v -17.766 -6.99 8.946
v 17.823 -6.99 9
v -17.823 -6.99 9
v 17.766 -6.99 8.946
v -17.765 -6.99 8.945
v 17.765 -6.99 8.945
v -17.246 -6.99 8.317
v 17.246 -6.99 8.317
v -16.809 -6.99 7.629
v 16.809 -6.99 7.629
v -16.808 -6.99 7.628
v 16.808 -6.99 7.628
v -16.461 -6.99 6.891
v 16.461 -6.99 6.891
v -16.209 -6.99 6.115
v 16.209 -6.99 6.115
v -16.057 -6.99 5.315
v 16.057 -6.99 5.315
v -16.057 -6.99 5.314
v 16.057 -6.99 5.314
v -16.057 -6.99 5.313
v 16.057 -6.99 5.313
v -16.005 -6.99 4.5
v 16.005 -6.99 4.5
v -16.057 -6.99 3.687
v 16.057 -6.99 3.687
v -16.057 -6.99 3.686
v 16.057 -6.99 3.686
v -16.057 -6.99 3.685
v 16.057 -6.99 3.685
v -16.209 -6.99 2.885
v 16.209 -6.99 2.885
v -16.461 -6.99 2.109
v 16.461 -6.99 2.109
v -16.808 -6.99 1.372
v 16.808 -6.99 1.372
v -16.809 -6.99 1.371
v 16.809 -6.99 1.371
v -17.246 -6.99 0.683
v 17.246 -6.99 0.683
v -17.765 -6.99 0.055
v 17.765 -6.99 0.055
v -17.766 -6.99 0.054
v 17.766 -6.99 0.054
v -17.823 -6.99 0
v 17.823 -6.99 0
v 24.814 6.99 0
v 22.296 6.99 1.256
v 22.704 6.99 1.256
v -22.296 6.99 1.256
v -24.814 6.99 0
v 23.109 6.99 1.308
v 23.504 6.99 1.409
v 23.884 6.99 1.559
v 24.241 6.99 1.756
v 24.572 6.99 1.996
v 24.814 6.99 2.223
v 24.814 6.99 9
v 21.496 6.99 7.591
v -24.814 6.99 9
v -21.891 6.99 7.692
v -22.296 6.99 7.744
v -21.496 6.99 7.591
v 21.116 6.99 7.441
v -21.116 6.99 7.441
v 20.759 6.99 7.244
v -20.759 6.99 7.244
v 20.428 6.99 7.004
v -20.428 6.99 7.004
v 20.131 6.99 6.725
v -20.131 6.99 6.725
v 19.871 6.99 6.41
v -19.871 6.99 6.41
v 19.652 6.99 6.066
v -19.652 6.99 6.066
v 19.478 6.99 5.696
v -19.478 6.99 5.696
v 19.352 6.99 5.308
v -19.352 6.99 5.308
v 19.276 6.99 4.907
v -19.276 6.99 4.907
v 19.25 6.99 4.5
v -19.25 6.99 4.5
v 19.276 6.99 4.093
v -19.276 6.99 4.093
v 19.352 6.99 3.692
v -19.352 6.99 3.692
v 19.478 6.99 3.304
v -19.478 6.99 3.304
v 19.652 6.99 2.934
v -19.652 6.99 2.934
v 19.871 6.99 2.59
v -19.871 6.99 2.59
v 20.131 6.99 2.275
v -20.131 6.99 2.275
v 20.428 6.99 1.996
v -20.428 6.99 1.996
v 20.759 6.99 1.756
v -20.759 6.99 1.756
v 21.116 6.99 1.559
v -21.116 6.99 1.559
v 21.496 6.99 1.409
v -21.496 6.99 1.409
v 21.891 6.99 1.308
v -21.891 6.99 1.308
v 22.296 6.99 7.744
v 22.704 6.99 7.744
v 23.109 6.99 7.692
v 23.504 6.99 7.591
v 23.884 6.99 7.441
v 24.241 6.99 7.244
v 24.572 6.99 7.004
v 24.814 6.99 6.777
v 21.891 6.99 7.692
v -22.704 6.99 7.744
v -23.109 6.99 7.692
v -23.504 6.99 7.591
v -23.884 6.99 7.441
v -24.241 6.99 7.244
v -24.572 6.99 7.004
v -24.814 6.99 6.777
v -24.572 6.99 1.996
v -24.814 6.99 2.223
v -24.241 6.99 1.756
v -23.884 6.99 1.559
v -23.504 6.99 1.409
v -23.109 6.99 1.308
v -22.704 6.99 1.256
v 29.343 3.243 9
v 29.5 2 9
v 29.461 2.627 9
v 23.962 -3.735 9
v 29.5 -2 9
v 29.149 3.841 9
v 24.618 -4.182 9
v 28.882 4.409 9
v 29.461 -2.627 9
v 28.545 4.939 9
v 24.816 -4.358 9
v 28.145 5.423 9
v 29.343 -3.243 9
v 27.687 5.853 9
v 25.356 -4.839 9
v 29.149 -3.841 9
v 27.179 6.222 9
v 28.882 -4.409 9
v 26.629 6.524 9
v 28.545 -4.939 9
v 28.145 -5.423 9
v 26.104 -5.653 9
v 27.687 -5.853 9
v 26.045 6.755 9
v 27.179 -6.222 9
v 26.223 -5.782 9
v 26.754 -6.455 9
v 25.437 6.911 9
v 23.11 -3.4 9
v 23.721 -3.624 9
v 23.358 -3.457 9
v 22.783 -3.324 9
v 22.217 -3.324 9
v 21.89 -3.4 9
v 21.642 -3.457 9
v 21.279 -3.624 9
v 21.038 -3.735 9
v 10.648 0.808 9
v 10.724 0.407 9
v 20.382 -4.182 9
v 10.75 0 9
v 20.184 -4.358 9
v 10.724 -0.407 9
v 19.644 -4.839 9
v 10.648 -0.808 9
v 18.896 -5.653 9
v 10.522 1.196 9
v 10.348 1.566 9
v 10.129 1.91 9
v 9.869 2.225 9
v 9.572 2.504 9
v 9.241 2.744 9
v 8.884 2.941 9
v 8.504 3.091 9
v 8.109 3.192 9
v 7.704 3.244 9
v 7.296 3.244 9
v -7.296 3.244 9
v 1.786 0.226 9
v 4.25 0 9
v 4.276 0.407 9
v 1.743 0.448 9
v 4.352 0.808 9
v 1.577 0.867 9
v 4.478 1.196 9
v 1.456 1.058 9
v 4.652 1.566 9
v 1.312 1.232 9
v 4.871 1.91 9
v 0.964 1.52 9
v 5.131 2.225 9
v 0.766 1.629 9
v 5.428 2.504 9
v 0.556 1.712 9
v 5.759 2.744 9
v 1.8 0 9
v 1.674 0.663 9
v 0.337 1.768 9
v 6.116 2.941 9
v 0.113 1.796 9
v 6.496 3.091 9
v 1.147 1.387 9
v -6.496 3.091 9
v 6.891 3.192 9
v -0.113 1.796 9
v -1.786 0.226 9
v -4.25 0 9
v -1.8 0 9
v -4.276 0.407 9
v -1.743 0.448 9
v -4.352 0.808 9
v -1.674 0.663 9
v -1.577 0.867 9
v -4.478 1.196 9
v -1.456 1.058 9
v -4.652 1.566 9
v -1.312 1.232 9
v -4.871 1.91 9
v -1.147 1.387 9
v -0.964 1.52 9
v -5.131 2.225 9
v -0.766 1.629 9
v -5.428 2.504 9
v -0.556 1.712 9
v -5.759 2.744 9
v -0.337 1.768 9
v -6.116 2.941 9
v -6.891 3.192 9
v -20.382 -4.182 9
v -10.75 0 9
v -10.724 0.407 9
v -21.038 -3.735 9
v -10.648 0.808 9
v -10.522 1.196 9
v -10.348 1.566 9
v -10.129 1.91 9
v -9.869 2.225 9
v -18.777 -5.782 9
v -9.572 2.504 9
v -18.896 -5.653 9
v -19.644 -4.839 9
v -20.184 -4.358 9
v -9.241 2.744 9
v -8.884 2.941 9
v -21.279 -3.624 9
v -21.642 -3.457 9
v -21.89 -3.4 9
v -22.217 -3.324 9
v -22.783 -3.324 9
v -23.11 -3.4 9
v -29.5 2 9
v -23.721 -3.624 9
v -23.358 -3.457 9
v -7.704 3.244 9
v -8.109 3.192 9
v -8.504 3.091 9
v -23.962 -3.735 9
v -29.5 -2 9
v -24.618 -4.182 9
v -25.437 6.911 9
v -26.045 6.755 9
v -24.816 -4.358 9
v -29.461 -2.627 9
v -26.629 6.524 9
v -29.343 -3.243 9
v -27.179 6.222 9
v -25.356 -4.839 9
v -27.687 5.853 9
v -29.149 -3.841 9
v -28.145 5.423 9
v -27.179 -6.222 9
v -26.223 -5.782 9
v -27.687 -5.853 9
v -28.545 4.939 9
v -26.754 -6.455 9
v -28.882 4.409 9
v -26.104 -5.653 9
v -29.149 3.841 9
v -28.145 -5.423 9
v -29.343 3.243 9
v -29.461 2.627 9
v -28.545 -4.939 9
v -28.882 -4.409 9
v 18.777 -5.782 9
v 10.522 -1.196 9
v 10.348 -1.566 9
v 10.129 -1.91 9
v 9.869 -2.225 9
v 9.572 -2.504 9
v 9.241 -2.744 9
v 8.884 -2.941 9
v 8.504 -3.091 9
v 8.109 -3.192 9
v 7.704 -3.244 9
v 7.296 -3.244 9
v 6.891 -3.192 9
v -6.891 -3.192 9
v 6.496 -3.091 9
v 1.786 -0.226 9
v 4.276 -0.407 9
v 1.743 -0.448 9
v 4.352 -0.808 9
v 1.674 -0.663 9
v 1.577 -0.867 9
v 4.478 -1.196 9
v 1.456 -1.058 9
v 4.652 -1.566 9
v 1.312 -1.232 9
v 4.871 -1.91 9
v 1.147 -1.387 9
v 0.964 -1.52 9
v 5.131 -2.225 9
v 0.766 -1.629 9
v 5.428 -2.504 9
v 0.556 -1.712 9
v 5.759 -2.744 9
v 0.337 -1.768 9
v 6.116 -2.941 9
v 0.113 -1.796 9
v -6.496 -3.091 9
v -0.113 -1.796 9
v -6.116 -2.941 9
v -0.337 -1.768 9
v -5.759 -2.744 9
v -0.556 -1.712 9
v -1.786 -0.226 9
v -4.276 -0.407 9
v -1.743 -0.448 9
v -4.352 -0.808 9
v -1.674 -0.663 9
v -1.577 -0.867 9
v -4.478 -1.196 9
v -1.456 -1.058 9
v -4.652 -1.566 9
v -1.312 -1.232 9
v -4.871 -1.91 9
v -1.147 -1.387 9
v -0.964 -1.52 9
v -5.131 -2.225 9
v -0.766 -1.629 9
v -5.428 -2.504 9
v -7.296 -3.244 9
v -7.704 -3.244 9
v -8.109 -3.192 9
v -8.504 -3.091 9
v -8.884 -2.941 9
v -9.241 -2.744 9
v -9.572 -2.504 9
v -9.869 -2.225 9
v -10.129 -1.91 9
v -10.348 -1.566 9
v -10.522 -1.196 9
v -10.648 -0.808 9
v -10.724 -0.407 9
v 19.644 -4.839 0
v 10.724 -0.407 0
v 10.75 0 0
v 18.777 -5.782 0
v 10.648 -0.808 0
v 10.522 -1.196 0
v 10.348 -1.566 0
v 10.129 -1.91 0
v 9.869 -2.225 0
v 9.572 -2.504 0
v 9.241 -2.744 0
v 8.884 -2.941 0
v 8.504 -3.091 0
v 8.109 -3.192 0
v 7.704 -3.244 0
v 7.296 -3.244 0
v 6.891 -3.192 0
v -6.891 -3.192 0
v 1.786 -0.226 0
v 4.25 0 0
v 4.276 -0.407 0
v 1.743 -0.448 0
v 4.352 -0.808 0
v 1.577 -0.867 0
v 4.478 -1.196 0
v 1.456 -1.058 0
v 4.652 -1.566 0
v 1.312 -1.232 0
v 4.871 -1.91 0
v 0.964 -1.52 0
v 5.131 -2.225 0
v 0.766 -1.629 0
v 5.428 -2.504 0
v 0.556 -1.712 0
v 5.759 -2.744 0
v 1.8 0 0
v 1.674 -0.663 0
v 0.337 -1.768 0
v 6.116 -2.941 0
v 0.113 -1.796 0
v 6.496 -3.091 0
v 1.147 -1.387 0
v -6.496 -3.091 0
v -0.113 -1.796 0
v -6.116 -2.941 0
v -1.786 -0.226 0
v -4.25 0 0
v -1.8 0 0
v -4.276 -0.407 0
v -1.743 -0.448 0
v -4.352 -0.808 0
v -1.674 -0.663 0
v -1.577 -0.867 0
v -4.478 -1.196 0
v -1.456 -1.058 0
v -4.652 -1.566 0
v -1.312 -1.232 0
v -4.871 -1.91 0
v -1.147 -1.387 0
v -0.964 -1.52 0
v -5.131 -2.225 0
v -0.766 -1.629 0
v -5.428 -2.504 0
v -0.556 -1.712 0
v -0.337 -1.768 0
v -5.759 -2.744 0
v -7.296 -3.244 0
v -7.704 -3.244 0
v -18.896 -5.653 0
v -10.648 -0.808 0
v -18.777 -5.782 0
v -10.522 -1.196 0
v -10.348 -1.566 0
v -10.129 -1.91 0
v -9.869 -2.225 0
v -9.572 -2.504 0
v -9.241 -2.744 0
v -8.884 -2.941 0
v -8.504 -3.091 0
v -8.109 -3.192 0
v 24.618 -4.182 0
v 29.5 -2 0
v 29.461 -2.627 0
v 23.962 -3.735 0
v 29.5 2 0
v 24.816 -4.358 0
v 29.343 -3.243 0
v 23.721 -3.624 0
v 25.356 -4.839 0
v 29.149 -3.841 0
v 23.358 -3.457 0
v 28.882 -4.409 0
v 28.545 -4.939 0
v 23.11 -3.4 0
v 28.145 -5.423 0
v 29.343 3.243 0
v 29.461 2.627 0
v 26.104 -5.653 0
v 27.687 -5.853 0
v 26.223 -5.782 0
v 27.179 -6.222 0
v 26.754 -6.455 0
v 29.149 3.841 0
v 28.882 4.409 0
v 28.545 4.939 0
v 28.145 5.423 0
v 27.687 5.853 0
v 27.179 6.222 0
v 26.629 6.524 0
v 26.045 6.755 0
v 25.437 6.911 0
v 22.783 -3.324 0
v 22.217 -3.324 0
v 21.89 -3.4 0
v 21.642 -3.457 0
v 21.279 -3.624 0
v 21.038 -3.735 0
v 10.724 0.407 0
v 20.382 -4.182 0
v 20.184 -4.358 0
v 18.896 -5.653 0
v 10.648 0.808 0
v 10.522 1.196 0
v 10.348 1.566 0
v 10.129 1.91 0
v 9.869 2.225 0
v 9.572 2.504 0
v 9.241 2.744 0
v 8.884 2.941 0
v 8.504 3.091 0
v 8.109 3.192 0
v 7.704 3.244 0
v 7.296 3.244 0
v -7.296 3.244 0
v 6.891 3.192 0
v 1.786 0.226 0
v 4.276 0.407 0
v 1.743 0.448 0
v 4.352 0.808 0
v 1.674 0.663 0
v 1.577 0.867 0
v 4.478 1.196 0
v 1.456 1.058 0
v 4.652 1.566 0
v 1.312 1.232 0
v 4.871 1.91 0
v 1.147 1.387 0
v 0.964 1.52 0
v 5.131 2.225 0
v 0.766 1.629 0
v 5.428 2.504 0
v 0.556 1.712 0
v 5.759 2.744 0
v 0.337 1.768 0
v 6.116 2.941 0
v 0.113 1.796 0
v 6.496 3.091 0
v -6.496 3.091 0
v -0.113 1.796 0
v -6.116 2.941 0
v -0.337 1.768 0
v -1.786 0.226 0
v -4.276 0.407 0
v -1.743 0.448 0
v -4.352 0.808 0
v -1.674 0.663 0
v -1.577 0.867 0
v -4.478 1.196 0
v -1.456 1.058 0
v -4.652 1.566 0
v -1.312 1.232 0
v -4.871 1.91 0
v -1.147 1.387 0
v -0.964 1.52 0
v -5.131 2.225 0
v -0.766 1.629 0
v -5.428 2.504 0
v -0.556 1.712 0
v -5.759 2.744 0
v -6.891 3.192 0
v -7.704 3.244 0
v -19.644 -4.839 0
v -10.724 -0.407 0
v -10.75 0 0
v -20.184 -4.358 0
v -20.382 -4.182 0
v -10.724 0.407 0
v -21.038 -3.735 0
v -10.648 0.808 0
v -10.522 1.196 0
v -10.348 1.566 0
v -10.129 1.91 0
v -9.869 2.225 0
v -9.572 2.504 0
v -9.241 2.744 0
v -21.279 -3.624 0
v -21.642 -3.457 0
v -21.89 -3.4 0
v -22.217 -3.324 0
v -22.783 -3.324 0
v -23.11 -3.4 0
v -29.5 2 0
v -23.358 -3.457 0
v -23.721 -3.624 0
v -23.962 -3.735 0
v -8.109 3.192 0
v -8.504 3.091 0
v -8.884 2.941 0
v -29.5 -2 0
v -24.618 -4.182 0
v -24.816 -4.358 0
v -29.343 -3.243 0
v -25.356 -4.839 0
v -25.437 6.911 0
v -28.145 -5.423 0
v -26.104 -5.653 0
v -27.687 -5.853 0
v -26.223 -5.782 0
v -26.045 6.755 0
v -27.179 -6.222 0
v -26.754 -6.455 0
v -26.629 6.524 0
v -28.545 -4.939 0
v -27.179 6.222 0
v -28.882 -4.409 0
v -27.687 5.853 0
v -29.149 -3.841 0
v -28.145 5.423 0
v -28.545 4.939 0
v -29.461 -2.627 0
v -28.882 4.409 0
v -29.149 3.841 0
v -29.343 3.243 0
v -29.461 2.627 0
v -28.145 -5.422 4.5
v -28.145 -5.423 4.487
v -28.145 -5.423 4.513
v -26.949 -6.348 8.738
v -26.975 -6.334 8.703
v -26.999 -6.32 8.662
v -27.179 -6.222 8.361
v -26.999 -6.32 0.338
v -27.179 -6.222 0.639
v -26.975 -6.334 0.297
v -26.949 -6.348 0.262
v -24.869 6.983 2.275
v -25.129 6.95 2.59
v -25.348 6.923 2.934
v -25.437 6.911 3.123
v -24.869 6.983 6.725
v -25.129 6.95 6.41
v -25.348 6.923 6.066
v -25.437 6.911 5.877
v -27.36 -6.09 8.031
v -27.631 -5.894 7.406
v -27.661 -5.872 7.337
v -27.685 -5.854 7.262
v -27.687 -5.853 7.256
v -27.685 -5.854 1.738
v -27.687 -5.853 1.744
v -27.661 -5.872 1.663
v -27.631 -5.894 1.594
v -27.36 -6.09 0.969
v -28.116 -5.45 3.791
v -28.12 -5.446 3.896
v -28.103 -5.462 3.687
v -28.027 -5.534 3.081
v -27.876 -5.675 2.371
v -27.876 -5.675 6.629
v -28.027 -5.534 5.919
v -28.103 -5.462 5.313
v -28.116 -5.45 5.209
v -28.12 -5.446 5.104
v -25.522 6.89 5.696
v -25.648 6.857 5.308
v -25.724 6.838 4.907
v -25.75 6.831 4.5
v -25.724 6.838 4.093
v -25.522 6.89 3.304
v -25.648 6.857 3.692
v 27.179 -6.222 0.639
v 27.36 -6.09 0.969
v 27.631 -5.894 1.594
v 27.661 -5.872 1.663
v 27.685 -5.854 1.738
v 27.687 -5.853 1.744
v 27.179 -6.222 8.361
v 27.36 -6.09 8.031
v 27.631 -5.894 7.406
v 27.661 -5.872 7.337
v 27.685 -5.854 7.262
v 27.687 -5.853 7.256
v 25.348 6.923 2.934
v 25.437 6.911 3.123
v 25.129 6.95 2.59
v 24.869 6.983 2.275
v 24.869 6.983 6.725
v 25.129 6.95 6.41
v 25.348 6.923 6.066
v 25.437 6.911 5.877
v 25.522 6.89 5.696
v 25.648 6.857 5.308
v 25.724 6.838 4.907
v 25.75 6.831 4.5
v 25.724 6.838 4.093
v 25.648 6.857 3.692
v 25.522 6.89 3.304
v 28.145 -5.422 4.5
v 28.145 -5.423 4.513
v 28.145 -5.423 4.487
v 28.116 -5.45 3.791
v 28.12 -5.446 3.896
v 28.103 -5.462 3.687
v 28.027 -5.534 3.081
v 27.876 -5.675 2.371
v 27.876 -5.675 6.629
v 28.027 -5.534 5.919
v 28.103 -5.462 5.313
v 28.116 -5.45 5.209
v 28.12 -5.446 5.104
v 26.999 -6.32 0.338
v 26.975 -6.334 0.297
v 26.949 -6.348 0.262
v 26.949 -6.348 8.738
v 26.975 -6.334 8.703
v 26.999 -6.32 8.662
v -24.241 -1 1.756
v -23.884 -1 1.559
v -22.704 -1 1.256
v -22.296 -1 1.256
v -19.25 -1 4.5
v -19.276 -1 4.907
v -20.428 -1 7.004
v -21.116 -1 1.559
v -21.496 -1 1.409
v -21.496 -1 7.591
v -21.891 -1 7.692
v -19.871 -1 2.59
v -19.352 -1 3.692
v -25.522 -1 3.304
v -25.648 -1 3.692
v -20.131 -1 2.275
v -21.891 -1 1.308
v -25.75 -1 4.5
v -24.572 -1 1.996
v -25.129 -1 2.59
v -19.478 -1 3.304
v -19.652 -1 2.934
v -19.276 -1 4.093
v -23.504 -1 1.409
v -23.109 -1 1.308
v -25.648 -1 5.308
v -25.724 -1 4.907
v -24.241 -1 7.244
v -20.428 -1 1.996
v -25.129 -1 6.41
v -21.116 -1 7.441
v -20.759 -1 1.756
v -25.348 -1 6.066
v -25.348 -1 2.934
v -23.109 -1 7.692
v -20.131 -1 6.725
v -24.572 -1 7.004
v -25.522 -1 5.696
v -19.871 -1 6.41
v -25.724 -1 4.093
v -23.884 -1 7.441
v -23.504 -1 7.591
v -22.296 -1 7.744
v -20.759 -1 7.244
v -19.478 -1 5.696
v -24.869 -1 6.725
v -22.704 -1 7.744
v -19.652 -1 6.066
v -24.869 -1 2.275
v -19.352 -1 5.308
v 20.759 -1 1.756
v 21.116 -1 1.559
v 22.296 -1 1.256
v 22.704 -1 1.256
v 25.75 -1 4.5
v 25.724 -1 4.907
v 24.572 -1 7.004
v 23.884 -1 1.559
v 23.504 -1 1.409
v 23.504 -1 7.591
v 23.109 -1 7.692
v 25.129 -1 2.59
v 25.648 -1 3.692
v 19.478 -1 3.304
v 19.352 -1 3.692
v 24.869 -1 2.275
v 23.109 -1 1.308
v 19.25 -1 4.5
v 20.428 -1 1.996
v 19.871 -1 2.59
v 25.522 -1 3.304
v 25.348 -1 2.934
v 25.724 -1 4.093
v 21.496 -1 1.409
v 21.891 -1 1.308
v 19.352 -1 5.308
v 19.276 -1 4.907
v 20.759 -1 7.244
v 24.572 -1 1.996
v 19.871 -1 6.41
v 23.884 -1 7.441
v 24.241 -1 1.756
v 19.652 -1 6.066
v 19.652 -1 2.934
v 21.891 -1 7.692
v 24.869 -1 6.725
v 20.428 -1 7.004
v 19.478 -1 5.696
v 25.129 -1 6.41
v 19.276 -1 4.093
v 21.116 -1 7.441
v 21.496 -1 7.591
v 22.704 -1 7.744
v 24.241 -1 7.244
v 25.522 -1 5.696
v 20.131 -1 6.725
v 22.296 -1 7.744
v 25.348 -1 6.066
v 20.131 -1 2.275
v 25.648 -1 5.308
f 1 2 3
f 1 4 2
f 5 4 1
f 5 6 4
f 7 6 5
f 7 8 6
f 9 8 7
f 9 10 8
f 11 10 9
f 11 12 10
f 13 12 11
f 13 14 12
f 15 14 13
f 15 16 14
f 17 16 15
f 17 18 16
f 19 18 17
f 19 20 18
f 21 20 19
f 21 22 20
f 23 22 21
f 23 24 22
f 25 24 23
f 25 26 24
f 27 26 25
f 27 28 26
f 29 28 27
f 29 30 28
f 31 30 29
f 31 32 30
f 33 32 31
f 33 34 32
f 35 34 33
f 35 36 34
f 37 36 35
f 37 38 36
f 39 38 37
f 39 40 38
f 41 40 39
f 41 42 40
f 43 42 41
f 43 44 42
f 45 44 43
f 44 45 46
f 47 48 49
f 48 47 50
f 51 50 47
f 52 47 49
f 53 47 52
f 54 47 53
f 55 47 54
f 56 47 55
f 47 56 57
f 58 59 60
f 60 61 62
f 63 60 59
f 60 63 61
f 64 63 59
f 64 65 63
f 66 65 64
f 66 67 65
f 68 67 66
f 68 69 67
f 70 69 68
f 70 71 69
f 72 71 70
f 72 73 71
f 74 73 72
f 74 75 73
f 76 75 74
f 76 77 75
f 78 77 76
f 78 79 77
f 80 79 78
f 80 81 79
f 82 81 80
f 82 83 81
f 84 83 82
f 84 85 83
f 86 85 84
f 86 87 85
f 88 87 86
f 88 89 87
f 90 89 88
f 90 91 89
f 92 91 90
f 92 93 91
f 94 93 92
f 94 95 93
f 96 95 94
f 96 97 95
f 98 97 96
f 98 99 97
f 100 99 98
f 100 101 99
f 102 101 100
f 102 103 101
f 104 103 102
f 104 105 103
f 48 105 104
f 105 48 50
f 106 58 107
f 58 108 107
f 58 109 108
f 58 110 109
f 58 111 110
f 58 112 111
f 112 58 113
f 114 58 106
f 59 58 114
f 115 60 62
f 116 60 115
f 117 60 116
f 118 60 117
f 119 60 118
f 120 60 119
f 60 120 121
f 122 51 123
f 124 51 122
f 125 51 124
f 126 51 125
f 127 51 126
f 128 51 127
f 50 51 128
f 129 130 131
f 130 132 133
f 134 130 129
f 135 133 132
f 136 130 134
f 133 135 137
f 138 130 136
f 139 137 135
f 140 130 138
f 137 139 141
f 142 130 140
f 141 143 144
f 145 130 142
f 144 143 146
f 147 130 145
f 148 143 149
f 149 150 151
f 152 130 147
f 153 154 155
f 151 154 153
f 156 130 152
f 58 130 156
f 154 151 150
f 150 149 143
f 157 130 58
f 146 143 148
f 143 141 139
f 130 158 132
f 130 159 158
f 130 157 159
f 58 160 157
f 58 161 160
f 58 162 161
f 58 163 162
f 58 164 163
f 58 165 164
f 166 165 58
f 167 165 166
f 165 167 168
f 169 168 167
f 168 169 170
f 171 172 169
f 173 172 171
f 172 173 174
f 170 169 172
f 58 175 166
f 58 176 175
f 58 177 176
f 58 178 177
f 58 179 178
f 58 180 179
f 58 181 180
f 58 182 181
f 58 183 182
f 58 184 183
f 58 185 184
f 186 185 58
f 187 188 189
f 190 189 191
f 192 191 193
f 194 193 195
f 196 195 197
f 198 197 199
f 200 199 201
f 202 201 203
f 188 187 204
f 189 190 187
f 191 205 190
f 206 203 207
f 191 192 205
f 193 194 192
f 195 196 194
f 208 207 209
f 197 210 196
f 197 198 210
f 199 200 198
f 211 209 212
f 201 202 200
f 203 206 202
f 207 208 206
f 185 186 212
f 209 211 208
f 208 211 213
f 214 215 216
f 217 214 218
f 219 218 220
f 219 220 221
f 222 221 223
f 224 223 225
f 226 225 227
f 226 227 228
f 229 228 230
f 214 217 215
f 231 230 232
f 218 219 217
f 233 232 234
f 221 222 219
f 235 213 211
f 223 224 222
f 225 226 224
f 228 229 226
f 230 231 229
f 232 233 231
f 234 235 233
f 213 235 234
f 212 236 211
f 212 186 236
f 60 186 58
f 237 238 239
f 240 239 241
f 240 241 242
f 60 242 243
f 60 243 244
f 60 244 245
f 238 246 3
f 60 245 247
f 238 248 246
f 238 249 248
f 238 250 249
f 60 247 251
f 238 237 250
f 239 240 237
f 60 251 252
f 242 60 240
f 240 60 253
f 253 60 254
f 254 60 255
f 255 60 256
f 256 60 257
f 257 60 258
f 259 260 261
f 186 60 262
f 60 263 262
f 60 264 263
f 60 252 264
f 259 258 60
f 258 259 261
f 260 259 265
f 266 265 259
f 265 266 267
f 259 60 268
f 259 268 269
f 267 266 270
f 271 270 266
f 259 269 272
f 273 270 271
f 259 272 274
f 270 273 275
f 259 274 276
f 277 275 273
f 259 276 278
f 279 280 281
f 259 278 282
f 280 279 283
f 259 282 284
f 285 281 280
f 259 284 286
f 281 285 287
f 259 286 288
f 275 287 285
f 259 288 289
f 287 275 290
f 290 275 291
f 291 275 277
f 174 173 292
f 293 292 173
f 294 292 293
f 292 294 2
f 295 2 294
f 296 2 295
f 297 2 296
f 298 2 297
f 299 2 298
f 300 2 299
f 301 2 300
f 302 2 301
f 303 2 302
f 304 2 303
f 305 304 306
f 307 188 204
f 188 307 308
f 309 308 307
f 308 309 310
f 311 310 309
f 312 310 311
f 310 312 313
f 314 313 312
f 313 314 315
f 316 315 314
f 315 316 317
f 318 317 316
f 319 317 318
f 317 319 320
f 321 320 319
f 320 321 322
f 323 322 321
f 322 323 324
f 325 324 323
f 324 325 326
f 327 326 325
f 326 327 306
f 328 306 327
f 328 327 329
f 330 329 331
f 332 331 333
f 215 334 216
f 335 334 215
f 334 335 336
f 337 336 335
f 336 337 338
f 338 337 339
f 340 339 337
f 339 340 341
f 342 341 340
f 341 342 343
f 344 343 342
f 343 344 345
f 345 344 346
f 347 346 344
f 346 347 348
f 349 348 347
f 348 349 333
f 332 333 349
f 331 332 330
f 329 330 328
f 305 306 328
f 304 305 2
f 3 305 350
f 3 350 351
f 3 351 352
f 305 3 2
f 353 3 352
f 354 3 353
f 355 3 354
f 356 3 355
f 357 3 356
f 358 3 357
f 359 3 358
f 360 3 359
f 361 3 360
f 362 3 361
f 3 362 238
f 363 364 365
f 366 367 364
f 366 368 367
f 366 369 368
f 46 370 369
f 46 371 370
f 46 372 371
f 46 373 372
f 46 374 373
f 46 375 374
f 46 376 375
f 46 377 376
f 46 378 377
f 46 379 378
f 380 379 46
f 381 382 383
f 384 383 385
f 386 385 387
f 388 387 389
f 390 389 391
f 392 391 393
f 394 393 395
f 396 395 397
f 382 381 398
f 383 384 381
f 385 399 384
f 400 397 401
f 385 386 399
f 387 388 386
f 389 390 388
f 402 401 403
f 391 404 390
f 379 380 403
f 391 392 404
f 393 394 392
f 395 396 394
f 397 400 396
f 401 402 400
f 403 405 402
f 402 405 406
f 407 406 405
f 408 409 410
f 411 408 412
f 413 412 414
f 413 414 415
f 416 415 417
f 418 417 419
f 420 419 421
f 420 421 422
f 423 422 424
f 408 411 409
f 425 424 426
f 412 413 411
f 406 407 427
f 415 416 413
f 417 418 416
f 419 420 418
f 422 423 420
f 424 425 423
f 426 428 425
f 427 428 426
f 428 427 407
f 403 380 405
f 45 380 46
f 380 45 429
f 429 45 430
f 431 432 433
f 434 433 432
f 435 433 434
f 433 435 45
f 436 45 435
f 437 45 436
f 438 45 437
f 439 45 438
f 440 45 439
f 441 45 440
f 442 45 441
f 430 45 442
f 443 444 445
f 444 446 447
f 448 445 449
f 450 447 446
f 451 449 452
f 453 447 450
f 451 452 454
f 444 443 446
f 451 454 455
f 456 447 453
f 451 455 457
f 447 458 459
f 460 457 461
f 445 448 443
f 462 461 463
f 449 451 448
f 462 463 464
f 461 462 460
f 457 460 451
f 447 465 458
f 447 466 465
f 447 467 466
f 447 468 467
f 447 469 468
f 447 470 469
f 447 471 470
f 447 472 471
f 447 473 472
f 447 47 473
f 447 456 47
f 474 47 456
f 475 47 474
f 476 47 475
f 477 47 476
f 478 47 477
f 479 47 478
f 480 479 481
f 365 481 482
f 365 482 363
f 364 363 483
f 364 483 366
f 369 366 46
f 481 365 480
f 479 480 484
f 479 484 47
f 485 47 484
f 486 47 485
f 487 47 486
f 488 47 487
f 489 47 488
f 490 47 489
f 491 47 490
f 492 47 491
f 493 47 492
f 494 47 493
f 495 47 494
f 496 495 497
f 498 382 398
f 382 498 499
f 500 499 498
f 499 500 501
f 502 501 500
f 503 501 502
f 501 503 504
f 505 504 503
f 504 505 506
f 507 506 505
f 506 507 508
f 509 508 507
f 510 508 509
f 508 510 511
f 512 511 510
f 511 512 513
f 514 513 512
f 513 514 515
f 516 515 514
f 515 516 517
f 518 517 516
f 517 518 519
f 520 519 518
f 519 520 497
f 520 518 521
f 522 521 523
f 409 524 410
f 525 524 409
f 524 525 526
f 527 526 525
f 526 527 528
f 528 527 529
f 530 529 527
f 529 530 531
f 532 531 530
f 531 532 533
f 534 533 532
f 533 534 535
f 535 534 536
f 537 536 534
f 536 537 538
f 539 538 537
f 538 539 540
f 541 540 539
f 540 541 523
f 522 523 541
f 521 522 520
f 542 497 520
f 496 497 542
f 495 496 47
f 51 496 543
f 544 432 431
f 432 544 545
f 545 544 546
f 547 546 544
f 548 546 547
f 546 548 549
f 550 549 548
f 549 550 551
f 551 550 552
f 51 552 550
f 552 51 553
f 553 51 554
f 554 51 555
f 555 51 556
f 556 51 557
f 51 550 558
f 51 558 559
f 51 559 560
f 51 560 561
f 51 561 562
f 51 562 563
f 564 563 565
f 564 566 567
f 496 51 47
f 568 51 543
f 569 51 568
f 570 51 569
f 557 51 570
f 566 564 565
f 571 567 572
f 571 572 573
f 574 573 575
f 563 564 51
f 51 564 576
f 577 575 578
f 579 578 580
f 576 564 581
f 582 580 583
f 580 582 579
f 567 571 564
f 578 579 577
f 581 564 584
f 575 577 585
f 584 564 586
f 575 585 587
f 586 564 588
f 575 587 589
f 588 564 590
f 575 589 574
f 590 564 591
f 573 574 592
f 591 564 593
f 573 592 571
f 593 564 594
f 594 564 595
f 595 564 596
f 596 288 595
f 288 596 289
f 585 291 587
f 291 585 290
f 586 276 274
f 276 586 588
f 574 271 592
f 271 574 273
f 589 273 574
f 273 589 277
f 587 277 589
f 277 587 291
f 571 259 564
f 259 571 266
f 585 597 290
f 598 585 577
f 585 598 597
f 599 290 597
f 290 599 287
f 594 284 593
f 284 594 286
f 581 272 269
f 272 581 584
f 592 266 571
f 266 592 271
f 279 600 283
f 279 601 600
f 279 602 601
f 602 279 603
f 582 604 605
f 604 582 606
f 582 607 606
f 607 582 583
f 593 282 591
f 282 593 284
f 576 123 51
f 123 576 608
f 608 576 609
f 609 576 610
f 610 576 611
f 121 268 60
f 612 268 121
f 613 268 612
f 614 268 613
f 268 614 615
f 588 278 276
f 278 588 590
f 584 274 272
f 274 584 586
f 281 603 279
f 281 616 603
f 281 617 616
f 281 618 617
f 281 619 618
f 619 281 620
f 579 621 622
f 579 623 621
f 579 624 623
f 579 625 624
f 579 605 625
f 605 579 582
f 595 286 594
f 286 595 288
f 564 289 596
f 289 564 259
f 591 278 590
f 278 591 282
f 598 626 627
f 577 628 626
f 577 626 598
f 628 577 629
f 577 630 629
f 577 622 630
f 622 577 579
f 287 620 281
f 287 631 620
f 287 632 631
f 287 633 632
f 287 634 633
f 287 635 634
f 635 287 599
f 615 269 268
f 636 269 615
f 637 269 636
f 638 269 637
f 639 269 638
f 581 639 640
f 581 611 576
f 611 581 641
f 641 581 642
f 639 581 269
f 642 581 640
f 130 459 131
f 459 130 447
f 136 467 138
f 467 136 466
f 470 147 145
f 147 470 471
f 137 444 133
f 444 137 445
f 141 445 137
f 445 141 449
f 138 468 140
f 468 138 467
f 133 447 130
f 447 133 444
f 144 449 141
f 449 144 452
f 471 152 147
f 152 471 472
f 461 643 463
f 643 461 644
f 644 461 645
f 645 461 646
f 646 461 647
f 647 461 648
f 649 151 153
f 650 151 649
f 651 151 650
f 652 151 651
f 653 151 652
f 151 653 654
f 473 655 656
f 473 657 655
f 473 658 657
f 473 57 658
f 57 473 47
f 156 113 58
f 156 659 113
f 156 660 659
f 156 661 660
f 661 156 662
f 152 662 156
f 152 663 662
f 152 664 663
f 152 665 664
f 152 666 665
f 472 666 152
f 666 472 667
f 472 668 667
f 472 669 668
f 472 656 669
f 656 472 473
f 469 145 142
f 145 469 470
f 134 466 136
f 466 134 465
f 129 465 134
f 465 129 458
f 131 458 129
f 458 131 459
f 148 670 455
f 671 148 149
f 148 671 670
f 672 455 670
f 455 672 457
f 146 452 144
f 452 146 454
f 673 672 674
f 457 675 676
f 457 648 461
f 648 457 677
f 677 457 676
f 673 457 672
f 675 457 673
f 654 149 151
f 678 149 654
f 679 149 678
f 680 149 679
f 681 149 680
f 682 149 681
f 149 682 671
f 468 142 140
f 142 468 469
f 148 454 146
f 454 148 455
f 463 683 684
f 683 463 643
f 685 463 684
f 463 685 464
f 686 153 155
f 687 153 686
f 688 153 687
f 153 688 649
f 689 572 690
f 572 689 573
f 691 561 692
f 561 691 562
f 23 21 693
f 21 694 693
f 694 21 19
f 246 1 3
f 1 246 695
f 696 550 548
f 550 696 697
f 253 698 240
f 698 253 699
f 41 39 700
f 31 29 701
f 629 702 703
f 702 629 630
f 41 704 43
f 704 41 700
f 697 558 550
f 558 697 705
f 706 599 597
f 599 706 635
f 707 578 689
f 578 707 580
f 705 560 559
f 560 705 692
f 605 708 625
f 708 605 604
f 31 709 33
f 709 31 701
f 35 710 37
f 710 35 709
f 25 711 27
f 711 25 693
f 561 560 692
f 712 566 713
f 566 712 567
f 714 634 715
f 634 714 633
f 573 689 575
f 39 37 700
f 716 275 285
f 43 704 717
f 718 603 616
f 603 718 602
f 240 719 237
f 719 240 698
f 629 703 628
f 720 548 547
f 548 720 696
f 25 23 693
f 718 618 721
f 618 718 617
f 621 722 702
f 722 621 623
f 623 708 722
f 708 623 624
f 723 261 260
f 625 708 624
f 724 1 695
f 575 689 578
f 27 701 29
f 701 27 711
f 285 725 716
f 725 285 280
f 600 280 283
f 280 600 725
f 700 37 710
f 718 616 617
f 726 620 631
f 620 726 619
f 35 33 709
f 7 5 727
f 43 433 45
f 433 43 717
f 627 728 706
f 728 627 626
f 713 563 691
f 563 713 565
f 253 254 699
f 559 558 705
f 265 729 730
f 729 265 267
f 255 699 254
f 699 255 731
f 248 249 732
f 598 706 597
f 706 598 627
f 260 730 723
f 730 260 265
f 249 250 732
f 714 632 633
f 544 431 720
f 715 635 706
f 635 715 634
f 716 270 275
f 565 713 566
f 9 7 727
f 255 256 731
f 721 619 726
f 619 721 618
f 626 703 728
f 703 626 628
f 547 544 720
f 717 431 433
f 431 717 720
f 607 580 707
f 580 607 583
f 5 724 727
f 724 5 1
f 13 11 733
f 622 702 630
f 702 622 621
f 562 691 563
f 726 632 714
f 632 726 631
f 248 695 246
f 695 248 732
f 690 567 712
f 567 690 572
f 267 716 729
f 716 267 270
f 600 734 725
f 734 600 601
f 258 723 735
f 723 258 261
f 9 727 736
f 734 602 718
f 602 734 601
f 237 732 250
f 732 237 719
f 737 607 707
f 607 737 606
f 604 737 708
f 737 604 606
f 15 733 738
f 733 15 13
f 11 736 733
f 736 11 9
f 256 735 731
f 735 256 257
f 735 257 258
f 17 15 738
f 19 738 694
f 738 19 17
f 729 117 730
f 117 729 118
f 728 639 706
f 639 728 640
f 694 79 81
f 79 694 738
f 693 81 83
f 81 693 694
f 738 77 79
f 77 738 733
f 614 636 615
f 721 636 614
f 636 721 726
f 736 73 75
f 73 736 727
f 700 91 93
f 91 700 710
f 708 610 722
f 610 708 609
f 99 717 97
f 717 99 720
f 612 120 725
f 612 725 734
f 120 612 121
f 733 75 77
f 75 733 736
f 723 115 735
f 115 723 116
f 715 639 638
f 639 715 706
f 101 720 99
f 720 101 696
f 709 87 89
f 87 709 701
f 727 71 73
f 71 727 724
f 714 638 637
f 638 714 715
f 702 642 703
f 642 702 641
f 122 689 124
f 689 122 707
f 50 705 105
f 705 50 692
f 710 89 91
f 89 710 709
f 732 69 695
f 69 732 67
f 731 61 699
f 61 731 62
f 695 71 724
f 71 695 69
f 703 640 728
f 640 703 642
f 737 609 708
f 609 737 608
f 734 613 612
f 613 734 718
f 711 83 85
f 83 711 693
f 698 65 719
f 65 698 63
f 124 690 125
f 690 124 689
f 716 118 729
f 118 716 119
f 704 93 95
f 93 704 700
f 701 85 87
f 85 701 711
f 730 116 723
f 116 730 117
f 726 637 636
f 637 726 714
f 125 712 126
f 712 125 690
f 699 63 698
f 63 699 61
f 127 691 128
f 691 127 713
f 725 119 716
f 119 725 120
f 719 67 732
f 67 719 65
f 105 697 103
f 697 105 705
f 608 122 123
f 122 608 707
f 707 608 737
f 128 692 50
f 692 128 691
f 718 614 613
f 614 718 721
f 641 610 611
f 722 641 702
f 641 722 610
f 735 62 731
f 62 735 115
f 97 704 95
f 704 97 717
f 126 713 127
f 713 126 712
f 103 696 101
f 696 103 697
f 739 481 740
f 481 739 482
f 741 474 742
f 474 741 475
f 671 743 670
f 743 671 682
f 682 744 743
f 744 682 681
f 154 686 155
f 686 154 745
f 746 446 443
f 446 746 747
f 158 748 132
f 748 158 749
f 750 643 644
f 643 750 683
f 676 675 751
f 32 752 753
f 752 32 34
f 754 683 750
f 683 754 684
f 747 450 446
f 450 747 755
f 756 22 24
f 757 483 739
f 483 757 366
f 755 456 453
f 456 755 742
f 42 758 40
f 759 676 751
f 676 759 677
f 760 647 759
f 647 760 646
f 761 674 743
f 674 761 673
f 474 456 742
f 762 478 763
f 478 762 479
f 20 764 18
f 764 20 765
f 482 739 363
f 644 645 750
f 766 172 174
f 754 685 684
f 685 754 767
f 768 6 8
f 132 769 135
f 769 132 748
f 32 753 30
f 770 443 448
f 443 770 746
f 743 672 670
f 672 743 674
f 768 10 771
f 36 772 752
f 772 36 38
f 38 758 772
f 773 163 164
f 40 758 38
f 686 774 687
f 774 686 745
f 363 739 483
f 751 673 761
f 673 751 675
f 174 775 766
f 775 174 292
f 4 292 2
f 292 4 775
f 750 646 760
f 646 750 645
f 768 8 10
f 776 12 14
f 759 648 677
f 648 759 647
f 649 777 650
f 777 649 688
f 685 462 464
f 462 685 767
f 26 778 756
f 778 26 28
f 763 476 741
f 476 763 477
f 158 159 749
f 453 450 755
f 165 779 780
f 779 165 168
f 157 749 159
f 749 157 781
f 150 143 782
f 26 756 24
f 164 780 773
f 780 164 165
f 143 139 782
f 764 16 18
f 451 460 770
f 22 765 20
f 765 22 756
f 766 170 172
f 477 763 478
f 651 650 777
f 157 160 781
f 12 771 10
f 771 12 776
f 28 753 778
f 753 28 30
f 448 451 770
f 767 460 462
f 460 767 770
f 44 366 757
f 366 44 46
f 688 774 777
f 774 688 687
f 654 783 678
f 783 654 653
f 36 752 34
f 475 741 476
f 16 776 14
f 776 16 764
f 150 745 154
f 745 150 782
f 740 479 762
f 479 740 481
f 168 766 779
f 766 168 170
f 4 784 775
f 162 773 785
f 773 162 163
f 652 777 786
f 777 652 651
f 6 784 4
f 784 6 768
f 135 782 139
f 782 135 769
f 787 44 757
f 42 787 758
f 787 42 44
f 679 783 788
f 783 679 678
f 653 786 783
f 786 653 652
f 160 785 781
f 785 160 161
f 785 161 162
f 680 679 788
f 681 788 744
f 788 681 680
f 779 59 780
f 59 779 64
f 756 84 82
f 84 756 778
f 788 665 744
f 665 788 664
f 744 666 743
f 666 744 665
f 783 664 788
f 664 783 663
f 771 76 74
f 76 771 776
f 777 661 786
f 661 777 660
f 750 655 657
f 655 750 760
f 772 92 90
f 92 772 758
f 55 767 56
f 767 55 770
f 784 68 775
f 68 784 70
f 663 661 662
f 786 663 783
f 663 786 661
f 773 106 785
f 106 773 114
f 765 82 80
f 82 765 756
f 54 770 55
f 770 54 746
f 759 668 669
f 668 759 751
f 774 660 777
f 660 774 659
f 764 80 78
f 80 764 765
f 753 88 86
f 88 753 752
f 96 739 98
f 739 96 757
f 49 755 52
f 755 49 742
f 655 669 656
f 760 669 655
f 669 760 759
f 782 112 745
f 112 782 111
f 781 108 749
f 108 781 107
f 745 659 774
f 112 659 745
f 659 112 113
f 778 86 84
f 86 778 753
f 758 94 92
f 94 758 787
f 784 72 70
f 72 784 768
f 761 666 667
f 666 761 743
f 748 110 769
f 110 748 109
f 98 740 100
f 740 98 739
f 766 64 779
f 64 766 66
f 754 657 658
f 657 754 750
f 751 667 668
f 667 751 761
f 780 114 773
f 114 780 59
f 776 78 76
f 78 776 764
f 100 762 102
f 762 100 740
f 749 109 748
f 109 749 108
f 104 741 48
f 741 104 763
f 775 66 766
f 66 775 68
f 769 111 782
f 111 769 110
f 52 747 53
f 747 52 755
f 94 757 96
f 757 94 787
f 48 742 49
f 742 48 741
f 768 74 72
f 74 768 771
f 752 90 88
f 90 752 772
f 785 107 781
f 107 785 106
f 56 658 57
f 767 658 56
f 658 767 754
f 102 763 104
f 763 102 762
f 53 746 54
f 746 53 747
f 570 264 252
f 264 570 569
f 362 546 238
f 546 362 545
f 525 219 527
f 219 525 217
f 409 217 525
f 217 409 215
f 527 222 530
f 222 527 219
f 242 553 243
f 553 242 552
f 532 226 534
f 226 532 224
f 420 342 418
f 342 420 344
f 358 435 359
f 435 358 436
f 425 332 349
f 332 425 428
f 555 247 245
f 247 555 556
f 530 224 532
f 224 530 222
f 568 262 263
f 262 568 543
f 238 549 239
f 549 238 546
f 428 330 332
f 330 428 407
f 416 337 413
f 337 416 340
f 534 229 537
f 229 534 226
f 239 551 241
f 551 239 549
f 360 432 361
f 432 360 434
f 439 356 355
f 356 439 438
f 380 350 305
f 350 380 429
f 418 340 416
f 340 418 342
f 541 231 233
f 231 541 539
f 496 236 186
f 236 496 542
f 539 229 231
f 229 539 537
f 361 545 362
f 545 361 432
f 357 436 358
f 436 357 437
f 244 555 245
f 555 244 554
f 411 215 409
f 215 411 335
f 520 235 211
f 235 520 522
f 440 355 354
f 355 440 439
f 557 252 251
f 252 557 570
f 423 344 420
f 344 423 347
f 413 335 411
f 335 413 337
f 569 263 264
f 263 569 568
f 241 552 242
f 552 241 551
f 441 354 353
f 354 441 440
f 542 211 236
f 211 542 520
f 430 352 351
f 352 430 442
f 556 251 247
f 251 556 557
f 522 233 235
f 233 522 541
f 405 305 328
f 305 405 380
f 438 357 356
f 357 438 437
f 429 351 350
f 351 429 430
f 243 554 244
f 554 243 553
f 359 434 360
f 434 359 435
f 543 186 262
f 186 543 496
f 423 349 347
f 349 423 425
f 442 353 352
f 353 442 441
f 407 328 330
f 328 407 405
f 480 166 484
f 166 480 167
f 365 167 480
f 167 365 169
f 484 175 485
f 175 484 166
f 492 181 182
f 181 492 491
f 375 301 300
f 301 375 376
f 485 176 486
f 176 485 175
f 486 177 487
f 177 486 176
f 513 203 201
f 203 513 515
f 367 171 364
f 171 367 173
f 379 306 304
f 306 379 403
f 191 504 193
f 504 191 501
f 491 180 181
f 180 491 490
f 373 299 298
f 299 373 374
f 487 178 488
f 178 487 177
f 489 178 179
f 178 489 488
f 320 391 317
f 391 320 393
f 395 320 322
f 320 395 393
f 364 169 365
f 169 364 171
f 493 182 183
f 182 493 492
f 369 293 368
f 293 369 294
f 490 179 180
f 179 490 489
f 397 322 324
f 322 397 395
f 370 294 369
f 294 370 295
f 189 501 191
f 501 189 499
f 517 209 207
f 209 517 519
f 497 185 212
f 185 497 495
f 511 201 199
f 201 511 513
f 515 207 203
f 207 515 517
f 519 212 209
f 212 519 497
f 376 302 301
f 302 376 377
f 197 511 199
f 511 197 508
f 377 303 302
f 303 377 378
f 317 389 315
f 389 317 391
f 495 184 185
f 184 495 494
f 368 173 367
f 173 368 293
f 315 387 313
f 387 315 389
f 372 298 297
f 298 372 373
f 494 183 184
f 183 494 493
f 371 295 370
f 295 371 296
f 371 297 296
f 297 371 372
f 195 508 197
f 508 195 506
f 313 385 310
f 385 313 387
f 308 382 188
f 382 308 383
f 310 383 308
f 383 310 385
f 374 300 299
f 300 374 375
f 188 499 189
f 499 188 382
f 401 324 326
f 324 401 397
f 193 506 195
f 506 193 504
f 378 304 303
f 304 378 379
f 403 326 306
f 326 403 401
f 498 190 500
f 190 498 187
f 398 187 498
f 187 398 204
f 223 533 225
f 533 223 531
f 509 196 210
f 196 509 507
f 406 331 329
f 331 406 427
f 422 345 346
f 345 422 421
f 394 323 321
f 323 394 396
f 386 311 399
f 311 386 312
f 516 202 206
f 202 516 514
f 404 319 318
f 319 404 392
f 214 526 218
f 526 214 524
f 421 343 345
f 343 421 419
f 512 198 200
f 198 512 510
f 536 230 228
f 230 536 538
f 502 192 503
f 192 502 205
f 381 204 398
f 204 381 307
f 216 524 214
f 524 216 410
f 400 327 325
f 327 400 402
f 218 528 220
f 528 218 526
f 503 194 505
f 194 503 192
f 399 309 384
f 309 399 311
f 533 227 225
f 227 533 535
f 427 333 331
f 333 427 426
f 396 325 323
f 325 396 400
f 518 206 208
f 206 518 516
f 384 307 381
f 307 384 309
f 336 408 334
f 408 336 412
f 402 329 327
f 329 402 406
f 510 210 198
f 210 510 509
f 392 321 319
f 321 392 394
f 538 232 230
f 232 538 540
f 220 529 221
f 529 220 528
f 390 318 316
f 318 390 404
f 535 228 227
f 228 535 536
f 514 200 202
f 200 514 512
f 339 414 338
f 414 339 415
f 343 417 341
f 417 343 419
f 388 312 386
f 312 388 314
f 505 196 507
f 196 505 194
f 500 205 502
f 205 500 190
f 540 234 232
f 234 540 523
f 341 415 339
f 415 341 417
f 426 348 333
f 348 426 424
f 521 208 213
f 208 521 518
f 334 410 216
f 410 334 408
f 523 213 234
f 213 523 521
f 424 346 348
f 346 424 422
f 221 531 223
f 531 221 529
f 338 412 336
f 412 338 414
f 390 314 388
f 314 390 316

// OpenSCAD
$fn = 50;


difference() {
	union() {
		hull() {
			translate(v = [-9.5000000000, 2.0000000000, 0]) {
				cylinder(h = 9, r = 5);
			}
			translate(v = [9.5000000000, 2.0000000000, 0]) {
				cylinder(h = 9, r = 5);
			}
			translate(v = [-9.5000000000, -2.0000000000, 0]) {
				cylinder(h = 9, r = 5);
			}
			translate(v = [9.5000000000, -2.0000000000, 0]) {
				cylinder(h = 9, r = 5);
			}
		}
		translate(v = [-15.0000000000, 0.0000000000, 0]) {
			hull() {
				translate(v = [-9.5000000000, 2.0000000000, 0]) {
					cylinder(h = 9, r = 5);
				}
				translate(v = [9.5000000000, 2.0000000000, 0]) {
					cylinder(h = 9, r = 5);
				}
				translate(v = [-9.5000000000, -2.0000000000, 0]) {
					cylinder(h = 9, r = 5);
				}
				translate(v = [9.5000000000, -2.0000000000, 0]) {
					cylinder(h = 9, r = 5);
				}
			}
		}
		translate(v = [15.0000000000, 0.0000000000, 0]) {
			hull() {
				translate(v = [-9.5000000000, 2.0000000000, 0]) {
					cylinder(h = 9, r = 5);
				}
				translate(v = [9.5000000000, 2.0000000000, 0]) {
					cylinder(h = 9, r = 5);
				}
				translate(v = [-9.5000000000, -2.0000000000, 0]) {
					cylinder(h = 9, r = 5);
				}
				translate(v = [9.5000000000, -2.0000000000, 0]) {
					cylinder(h = 9, r = 5);
				}
			}
		}
	}
	union() {
		translate(v = [-22.5000000000, -7.0000000000, 4.5000000000]) {
			rotate(a = [90, 0, 0]) {
				difference() {
					union() {
						#translate(v = [0, 0, -14.0000000000]) {
							cylinder(h = 14, r = 2.2500000000);
						}
						#translate(v = [0, 0, -6]) {
							cylinder(h = 6, r1 = 3.2500000000, r2 = 6.5000000000);
						}
						#translate(v = [0, 0, -14.0000000000]) {
							cylinder(h = 14, r = 3.2500000000);
						}
						#translate(v = [0, 0, -14.0000000000]) {
							cylinder(h = 14, r = 2.2500000000);
						}
					}
					union();
				}
			}
		}
		translate(v = [22.5000000000, -7.0000000000, 4.5000000000]) {
			rotate(a = [90, 0, 0]) {
				difference() {
					union() {
						#translate(v = [0, 0, -14.0000000000]) {
							cylinder(h = 14, r = 2.2500000000);
						}
						#translate(v = [0, 0, -6]) {
							cylinder(h = 6, r1 = 3.2500000000, r2 = 6.5000000000);
						}
						#translate(v = [0, 0, -14.0000000000]) {
							cylinder(h = 14, r = 3.2500000000);
						}
						#translate(v = [0, 0, -14.0000000000]) {
							cylinder(h = 14, r = 2.2500000000);
						}
					}
					union();
				}
			}
		}
		translate(v = [-7.5000000000, 0.0000000000, 0]) {
			translate(v = [0, 0, -100]) {
				cylinder(h = 200, r = 3.2500000000);
			}
		}
		translate(v = [7.5000000000, 0.0000000000, 0]) {
			translate(v = [0, 0, -100]) {
				cylinder(h = 200, r = 3.2500000000);
			}
		}
		translate(v = [-7.5000000000, 0.0000000000, 0]) {
			translate(v = [0, 0, -100]) {
				cylinder(h = 200, r = 1.8000000000);
			}
		}
		translate(v = [0, 0, -100]) {
			cylinder(h = 200, r = 1.8000000000);
		}
		translate(v = [7.5000000000, 0.0000000000, 0]) {
			translate(v = [0, 0, -100]) {
				cylinder(h = 200, r = 1.8000000000);
			}
		}
	}
}
